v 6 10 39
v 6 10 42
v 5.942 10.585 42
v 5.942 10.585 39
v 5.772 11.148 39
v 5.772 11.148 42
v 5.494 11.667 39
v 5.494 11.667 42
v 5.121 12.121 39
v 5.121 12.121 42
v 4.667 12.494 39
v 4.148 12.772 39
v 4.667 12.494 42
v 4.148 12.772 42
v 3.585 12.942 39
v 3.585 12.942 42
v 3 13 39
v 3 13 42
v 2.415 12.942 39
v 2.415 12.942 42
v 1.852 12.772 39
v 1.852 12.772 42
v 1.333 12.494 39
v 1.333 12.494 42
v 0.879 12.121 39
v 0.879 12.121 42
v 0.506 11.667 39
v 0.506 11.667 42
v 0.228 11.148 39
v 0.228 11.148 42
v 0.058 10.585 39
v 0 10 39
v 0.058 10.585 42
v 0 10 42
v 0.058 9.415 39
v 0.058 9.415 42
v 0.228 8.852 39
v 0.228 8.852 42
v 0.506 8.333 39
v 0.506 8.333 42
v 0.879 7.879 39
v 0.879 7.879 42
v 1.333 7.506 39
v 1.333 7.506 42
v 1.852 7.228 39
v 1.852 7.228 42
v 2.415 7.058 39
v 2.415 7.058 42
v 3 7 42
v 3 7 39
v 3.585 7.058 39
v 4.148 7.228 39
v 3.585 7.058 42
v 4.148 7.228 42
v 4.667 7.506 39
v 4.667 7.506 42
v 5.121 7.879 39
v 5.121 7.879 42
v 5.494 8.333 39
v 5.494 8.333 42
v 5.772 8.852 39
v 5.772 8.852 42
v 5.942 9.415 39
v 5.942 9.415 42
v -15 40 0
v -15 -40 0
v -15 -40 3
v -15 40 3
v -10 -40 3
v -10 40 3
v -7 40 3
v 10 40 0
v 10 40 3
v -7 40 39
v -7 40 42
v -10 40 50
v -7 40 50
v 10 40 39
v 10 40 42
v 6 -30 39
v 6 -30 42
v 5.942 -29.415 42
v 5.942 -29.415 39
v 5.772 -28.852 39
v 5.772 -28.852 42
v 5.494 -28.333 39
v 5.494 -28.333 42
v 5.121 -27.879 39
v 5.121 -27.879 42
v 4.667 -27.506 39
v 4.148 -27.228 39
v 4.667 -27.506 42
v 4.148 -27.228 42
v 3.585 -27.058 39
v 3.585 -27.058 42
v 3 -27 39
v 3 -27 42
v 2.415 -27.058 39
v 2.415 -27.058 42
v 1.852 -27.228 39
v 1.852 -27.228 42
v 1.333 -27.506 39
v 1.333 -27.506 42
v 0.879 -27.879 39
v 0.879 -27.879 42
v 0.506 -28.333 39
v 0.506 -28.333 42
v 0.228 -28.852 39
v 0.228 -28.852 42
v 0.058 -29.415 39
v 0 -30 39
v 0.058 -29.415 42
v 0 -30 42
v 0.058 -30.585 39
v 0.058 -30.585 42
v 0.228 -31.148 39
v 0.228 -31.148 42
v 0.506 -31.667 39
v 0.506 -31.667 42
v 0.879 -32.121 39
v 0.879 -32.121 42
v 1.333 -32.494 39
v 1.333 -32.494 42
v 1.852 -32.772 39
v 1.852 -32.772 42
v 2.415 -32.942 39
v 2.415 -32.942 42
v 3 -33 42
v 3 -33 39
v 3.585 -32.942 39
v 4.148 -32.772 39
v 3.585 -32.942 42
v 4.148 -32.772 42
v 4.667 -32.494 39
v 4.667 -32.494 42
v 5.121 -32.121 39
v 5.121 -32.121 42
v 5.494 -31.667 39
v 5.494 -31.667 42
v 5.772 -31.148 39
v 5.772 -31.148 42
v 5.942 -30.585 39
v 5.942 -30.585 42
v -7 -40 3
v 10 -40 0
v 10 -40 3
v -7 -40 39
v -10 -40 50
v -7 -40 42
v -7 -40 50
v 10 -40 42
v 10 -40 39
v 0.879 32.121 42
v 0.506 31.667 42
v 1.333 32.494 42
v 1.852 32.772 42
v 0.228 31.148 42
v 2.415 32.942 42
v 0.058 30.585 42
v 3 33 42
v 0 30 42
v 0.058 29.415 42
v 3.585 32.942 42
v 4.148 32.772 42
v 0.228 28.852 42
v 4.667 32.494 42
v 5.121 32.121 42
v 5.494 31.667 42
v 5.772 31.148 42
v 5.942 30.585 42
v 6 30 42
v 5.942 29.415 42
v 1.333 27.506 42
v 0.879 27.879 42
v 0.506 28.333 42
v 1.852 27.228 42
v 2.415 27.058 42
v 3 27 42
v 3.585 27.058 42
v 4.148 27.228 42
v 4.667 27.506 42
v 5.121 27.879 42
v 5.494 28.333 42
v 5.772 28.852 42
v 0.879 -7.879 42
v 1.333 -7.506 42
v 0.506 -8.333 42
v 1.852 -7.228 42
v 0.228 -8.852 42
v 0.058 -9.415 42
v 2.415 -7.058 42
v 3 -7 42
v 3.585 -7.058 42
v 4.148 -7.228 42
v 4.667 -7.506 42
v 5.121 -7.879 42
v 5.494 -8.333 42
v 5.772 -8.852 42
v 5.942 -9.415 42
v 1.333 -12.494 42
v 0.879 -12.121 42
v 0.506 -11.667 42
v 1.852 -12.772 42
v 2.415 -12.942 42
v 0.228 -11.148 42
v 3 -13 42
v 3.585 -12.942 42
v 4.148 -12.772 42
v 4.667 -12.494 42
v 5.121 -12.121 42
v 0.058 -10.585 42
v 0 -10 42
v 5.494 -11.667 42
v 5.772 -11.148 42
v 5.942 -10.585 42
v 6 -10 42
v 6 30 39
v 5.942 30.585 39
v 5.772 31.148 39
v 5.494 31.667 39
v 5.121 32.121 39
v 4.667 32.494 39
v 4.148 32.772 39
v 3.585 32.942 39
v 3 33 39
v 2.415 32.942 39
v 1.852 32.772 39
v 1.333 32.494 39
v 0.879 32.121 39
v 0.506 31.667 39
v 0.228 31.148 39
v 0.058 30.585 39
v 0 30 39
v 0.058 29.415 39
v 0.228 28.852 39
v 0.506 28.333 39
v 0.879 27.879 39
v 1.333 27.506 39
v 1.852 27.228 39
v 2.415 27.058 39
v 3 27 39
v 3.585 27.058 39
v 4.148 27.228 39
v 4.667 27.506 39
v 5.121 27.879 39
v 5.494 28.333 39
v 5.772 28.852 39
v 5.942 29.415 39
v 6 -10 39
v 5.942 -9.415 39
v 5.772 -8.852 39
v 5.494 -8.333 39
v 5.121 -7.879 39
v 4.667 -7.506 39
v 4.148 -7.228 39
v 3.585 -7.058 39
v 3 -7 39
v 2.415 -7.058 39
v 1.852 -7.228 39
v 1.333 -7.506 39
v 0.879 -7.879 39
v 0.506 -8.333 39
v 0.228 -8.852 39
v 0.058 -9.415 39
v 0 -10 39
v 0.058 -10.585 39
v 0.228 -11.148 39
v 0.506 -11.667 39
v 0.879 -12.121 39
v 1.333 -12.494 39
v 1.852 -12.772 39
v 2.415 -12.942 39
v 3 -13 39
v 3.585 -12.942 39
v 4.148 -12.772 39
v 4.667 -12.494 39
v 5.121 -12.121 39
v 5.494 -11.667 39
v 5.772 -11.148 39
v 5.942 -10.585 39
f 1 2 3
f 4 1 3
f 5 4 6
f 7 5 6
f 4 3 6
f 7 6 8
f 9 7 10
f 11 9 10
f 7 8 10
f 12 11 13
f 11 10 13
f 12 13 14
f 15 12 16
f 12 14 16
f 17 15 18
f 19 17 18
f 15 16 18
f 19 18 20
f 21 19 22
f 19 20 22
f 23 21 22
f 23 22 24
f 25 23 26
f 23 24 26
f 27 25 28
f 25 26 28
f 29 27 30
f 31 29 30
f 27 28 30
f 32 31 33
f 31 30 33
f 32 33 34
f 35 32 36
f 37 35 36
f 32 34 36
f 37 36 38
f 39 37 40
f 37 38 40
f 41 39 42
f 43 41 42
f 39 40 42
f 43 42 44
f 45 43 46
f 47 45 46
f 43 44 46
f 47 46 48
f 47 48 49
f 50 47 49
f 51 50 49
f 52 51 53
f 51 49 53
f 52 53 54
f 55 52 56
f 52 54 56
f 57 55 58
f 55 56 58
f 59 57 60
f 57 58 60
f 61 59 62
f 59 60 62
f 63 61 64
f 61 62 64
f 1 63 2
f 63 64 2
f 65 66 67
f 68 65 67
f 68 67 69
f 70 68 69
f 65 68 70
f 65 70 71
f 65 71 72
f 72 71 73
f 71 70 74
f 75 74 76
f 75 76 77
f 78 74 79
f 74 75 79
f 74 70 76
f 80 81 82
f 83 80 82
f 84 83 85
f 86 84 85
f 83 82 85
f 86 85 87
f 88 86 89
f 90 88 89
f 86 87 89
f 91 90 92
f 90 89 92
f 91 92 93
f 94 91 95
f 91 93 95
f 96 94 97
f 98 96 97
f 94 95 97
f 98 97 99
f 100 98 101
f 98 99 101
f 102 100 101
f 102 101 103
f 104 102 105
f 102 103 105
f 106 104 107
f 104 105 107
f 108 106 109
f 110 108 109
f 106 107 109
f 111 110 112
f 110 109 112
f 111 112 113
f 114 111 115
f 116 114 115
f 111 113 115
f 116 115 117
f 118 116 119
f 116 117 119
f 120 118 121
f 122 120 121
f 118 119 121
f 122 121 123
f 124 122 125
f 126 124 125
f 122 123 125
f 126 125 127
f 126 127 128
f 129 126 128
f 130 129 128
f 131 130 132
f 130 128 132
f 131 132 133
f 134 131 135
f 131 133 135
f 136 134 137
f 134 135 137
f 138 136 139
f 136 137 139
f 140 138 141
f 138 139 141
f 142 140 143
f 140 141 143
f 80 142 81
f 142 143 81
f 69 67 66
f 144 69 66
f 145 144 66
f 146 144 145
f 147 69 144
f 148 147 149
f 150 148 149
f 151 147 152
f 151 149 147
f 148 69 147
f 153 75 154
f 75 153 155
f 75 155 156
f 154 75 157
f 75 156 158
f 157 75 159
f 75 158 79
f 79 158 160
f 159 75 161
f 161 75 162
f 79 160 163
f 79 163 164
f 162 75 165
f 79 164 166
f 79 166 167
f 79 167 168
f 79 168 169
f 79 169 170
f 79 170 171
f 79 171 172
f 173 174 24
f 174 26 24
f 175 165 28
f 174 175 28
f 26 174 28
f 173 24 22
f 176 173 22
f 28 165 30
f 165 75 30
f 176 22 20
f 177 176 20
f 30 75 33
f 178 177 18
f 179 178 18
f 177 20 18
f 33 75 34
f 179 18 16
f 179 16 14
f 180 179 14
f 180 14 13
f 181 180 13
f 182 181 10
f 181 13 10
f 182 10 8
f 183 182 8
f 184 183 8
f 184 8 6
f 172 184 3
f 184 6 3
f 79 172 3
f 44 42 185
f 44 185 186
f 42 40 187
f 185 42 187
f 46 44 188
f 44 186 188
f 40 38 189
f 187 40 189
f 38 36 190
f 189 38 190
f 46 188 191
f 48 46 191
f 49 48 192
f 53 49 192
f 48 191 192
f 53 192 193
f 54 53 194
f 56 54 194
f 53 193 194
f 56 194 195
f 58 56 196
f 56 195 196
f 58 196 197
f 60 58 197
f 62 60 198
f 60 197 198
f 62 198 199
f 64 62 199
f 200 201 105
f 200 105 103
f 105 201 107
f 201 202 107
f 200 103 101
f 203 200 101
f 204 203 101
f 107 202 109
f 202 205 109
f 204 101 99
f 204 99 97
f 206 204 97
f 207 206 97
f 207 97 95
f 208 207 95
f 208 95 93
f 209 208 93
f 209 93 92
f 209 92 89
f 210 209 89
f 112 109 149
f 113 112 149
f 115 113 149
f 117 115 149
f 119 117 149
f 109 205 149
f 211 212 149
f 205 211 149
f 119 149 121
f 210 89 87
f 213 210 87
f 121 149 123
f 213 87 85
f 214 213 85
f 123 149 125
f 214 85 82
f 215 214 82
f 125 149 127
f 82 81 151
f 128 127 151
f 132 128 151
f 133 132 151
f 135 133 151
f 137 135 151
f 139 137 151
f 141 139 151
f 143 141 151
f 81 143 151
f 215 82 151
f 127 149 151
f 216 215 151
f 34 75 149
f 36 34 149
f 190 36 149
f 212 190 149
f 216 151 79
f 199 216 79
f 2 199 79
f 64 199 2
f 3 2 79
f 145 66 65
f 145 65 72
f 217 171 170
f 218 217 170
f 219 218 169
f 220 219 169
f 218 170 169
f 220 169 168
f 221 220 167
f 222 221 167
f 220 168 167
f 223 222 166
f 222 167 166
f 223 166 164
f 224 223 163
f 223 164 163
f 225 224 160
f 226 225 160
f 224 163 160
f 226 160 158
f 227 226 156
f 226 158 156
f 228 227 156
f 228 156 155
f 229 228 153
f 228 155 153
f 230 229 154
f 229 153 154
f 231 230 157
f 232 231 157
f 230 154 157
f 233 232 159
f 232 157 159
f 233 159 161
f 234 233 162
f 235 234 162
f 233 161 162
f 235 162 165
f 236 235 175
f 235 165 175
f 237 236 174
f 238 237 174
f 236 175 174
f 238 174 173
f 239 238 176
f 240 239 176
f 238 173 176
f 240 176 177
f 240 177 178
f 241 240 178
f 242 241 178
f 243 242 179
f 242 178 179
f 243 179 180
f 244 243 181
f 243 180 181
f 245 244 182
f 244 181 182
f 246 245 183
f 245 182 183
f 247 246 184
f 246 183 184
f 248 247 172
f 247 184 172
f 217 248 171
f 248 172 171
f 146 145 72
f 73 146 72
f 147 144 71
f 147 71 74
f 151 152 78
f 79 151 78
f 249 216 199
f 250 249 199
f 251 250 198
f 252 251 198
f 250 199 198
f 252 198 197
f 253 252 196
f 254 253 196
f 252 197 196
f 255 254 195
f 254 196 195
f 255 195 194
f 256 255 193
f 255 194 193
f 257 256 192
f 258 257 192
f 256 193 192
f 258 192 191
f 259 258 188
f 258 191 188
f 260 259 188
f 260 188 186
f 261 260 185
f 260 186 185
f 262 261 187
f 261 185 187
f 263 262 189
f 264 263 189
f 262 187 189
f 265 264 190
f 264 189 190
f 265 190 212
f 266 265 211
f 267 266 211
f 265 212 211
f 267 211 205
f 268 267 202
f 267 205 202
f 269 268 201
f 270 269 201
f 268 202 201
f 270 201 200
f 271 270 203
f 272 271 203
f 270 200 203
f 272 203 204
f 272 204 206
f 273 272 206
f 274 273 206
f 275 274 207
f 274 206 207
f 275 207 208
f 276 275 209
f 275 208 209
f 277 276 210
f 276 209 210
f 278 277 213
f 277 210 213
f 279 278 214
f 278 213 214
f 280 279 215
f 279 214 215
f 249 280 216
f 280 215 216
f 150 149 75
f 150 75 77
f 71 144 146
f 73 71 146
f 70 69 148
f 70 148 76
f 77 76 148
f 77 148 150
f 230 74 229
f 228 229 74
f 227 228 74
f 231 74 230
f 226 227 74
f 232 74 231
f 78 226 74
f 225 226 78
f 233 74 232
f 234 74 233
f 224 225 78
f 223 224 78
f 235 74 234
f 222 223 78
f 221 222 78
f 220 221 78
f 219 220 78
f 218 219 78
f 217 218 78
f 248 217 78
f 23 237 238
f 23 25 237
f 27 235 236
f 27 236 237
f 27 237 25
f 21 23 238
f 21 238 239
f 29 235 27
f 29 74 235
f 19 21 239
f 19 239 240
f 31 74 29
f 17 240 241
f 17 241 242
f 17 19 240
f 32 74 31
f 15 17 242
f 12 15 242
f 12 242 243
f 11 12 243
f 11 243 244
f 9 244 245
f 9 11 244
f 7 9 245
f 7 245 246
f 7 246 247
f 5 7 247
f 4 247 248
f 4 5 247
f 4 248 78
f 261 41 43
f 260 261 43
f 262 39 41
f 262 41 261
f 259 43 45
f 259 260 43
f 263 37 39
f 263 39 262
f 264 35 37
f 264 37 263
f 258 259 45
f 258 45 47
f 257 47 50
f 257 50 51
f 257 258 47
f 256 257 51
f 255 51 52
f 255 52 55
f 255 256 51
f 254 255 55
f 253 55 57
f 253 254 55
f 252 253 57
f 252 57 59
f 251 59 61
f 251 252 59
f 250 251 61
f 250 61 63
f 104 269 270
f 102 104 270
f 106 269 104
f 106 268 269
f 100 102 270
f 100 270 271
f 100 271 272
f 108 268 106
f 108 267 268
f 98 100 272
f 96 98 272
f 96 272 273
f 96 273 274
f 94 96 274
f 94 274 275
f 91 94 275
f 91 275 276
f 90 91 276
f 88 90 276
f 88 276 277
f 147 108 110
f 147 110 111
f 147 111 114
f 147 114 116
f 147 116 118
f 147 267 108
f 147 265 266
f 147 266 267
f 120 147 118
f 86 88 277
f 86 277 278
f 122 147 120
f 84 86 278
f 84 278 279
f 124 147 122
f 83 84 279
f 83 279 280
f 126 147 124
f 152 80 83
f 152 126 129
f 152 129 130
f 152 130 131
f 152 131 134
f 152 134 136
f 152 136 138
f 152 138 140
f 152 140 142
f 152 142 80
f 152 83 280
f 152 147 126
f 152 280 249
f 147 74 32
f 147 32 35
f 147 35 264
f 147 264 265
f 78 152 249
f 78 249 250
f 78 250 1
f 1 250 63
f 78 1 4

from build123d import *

# Parameters (mm, degrees)
F0_W     = 20
F0_H     = 80
F1_DEPTH = 50
F2_W     = 17
F2_H     = 36
F2_H_2   = 8
F3_DEPTH = 80.001
F4_R     = 3
F5_DEPTH = 3
F6_W     = 5
F6_H     = 3
F7_DEPTH = 80


with BuildPart() as f1:
    # F0 (on Top) → F1 (new body)
    with BuildSketch(Plane.XY):
        Rectangle(F0_W, F0_H)
    extrude(amount=F1_DEPTH)

    # F2 (on face) → F3 (cut, through all)
    with BuildSketch(Plane.XZ.offset(40)):
        with Locations((1.5, 21)):
            Rectangle(F2_W, F2_H)
        with Locations((1.5, 46)):
            Rectangle(F2_W, F2_H_2)
    extrude(amount=-F3_DEPTH, mode=Mode.SUBTRACT)

    # F4 (on face) → F5 (cut, through all)
    with BuildSketch(Plane.XY.offset(42)):
        with Locations((3, -30)):
            Circle(F4_R)
        with Locations((3, -10)):
            Circle(F4_R)
        with Locations((3, 10)):
            Circle(F4_R)
        with Locations((3, 30)):
            Circle(F4_R)
    extrude(amount=-F5_DEPTH, mode=Mode.SUBTRACT)

    # F6 (on face) → F7 (join, through all)
    with BuildSketch(Plane.XZ.offset(40)):
        with Locations((-12.5, 1.5)):
            Rectangle(F6_W, F6_H)
    extrude(amount=-F7_DEPTH)


solid = f1.part
